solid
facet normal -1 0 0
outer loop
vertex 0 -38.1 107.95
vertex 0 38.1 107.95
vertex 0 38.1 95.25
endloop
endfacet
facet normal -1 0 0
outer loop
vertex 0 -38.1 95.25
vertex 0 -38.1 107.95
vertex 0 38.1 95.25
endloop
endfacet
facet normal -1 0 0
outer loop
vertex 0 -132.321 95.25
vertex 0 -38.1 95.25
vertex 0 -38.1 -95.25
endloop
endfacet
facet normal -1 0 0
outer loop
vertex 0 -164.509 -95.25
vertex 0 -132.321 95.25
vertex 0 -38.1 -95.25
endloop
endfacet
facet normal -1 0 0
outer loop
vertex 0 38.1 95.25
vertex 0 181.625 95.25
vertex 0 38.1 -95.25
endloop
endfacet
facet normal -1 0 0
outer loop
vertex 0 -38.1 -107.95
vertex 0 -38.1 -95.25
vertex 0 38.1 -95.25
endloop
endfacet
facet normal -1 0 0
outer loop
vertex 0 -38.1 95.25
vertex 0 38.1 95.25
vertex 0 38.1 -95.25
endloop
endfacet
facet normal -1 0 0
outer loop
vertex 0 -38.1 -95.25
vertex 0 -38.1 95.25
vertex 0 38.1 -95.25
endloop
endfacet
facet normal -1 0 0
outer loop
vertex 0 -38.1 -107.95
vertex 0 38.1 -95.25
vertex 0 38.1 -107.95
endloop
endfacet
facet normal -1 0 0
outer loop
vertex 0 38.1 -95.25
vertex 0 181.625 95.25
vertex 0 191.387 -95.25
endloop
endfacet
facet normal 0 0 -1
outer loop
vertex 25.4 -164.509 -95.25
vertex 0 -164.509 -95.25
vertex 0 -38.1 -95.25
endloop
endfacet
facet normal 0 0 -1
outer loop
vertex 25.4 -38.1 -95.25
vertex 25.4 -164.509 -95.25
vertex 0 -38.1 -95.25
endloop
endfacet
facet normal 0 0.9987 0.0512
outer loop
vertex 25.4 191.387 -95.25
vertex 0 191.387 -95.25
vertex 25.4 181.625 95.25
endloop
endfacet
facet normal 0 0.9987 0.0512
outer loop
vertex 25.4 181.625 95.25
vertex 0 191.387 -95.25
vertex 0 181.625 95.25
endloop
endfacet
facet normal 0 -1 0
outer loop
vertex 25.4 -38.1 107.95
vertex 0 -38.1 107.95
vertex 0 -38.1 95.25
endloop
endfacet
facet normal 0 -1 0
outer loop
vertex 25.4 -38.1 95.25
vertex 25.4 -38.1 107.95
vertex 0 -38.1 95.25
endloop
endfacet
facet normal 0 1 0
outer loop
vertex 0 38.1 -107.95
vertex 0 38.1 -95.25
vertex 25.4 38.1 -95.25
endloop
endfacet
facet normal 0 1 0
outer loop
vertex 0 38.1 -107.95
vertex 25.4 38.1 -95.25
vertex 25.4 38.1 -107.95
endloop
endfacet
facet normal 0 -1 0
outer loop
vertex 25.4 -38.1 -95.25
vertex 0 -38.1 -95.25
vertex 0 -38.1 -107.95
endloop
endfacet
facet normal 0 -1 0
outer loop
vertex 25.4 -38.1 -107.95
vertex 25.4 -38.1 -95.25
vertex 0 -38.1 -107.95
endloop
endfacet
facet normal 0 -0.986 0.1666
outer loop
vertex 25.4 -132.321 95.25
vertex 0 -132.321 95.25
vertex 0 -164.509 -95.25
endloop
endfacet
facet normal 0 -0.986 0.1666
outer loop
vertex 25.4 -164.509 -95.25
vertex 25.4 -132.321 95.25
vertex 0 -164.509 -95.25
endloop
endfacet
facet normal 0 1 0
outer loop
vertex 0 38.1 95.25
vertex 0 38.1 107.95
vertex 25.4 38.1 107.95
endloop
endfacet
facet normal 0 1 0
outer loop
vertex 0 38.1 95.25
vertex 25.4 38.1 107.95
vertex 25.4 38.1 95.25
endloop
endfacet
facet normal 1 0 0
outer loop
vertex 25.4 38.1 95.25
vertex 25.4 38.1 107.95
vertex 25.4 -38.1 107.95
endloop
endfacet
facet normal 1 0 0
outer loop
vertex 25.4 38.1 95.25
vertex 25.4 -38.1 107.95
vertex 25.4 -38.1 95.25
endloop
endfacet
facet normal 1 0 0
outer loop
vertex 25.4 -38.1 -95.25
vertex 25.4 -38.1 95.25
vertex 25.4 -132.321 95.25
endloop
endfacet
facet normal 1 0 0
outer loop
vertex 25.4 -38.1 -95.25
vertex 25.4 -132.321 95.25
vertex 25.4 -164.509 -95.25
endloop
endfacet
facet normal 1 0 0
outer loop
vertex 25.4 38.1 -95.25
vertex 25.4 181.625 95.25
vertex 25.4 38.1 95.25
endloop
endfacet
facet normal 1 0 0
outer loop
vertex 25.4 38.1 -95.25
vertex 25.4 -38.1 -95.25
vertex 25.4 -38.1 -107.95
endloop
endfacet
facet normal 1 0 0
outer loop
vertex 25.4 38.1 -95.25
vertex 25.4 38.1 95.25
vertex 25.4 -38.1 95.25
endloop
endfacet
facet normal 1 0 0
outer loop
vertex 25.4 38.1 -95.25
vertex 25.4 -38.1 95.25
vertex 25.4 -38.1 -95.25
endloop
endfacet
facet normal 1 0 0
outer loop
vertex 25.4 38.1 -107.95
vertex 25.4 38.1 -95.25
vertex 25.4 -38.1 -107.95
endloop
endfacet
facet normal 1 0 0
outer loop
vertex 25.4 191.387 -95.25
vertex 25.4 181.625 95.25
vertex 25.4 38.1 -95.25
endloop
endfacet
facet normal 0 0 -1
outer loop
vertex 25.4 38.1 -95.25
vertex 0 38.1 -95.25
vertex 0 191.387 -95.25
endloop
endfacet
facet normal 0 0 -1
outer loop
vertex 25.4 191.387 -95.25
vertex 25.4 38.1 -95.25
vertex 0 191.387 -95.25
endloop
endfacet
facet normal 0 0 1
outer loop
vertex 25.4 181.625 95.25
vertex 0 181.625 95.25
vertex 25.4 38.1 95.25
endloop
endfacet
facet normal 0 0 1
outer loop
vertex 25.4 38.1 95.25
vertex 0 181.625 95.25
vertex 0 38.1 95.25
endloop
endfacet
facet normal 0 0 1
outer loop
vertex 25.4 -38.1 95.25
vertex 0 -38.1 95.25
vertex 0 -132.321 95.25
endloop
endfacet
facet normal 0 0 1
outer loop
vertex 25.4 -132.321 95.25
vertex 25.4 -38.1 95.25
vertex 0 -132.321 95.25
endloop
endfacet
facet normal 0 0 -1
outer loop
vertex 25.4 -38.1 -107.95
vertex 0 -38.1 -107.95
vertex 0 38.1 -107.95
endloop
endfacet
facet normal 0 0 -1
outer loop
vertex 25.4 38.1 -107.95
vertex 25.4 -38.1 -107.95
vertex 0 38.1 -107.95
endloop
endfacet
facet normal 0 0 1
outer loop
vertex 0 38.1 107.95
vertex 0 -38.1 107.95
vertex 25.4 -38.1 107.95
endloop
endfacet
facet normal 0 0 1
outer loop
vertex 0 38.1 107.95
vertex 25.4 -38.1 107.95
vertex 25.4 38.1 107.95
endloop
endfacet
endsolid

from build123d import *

# Parameters (mm, degrees)
SKETCH1_W           = 12.7
SKETCH1_H           = 76.2
SKETCH1_W_2         = 190.5
BOSS_EXTRUDE1_DEPTH = 25.4


with BuildPart() as part:
    # Sketch1 → Boss-Extrude1 (new body)
    with BuildSketch(Plane(origin=(0, 0, 0), x_dir=(0, 0, -1), z_dir=(1, 0, 0))):
        Polygon((95.25, 191.38745187), (-95.25, 181.62487678), (-95.25, 38.1), (95.25, 38.1), align=None)
        with Locations((101.6, 0)):
            Rectangle(SKETCH1_W, SKETCH1_H)
        Rectangle(SKETCH1_W_2, SKETCH1_H)
        with Locations((-101.6, 0)):
            Rectangle(SKETCH1_W, SKETCH1_H)
        Polygon((95.25, -38.1), (-95.25, -38.1), (-95.25, -132.320724436), (95.25, -164.508767502), align=None)
    extrude(amount=BOSS_EXTRUDE1_DEPTH)


solid = part.part
